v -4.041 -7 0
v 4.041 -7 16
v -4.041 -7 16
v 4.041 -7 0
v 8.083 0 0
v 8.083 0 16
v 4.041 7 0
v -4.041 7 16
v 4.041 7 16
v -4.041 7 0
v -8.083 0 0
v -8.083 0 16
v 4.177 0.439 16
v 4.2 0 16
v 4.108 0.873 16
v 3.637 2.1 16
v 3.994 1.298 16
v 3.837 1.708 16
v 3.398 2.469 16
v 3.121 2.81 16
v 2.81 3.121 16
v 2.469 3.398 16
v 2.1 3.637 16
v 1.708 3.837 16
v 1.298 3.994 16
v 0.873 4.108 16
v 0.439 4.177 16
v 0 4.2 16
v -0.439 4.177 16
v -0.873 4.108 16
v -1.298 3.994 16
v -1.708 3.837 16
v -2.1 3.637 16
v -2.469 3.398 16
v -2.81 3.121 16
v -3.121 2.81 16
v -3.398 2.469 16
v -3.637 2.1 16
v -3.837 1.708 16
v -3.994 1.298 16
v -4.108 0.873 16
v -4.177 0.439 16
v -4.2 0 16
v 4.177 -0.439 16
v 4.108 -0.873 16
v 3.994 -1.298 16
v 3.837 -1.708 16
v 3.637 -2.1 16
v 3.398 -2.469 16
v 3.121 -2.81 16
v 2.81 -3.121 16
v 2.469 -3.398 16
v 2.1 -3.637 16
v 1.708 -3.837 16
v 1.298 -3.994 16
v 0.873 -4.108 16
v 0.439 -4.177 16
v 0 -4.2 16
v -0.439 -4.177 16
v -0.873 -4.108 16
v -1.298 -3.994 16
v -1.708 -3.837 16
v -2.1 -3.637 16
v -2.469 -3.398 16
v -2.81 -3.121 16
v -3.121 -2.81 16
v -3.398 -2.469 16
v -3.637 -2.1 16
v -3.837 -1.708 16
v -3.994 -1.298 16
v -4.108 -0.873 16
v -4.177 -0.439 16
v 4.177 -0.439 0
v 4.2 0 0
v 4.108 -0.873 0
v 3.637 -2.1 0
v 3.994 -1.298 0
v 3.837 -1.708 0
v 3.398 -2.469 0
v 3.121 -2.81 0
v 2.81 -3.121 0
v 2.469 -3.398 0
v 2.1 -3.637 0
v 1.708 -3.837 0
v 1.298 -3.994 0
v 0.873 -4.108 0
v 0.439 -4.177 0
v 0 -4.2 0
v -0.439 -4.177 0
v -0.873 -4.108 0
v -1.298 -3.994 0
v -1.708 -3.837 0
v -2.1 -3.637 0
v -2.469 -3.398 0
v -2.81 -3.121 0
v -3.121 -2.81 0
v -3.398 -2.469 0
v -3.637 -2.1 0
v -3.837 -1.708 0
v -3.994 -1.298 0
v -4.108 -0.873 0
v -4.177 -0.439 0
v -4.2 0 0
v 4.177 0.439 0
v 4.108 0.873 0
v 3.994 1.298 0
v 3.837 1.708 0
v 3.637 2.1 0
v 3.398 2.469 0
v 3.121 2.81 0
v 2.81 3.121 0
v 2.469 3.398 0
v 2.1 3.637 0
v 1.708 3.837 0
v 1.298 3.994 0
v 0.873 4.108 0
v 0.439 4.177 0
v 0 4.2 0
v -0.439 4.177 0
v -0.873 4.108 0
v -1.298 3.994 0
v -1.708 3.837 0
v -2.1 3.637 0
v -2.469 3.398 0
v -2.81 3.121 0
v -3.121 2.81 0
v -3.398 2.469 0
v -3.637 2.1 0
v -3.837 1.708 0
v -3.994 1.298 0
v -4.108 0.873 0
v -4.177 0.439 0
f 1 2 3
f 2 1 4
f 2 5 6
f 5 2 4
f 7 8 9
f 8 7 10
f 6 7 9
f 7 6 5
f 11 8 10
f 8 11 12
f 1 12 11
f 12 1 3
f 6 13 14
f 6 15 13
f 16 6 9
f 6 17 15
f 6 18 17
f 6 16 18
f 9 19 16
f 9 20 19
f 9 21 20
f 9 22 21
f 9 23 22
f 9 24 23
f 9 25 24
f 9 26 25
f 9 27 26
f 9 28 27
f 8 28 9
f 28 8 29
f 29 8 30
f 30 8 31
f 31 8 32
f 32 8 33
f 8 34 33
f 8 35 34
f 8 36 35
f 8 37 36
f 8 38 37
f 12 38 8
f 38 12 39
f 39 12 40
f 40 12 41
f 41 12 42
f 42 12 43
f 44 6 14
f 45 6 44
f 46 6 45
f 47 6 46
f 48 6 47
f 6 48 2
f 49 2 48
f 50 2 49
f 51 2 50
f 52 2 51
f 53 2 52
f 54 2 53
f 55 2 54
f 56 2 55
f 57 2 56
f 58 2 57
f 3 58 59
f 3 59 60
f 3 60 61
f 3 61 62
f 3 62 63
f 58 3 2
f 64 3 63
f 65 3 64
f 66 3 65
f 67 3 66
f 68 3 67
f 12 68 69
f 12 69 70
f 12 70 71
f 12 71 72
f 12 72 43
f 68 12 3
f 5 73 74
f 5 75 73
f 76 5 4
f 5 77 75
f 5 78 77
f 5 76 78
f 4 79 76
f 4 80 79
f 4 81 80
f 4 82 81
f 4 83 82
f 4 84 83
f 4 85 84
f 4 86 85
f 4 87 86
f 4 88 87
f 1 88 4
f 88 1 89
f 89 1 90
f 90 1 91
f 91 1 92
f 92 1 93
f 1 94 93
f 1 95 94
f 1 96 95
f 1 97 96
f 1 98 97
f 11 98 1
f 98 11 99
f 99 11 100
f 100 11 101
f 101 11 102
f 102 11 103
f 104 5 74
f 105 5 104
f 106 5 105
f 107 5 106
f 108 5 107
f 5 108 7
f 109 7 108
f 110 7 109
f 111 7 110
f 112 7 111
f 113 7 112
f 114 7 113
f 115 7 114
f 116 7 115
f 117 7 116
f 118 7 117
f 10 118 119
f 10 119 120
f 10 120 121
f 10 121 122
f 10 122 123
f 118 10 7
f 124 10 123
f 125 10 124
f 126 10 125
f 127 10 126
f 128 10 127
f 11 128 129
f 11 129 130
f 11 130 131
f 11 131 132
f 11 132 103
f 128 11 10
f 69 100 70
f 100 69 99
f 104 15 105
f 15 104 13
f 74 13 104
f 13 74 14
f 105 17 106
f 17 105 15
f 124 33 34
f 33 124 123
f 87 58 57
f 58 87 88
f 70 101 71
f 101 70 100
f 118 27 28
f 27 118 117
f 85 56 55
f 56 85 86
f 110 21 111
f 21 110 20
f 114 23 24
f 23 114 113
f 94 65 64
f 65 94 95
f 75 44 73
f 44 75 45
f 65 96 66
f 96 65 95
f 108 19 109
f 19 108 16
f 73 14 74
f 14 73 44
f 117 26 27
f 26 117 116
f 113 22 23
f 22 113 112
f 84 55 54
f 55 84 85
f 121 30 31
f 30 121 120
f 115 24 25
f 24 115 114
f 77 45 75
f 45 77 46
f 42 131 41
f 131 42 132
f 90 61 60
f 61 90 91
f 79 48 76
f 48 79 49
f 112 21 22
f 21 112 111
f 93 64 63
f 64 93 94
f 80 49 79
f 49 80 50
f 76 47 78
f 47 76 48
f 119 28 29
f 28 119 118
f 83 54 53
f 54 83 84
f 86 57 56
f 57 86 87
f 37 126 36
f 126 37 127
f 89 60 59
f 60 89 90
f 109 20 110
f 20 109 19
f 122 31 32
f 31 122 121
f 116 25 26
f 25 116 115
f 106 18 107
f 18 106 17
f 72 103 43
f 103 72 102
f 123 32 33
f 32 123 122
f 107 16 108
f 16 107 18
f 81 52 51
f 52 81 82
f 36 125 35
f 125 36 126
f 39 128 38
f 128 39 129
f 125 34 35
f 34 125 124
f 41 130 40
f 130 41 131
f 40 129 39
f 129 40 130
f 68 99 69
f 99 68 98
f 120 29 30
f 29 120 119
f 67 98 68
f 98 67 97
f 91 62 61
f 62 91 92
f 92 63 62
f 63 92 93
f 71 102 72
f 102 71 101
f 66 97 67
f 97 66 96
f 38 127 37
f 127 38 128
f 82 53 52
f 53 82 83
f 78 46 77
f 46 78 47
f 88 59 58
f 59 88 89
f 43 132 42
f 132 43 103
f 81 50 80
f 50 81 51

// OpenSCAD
// Hex spacer.
$fn = 60;
eps = 0.02;
inner_d = 8.4;
flat = 14;
length = 16;
difference() { cylinder(d=flat/cos(30),h=length,$fn=6); translate([0,0,-eps]) cylinder(d=inner_d,h=length+2*eps); }
